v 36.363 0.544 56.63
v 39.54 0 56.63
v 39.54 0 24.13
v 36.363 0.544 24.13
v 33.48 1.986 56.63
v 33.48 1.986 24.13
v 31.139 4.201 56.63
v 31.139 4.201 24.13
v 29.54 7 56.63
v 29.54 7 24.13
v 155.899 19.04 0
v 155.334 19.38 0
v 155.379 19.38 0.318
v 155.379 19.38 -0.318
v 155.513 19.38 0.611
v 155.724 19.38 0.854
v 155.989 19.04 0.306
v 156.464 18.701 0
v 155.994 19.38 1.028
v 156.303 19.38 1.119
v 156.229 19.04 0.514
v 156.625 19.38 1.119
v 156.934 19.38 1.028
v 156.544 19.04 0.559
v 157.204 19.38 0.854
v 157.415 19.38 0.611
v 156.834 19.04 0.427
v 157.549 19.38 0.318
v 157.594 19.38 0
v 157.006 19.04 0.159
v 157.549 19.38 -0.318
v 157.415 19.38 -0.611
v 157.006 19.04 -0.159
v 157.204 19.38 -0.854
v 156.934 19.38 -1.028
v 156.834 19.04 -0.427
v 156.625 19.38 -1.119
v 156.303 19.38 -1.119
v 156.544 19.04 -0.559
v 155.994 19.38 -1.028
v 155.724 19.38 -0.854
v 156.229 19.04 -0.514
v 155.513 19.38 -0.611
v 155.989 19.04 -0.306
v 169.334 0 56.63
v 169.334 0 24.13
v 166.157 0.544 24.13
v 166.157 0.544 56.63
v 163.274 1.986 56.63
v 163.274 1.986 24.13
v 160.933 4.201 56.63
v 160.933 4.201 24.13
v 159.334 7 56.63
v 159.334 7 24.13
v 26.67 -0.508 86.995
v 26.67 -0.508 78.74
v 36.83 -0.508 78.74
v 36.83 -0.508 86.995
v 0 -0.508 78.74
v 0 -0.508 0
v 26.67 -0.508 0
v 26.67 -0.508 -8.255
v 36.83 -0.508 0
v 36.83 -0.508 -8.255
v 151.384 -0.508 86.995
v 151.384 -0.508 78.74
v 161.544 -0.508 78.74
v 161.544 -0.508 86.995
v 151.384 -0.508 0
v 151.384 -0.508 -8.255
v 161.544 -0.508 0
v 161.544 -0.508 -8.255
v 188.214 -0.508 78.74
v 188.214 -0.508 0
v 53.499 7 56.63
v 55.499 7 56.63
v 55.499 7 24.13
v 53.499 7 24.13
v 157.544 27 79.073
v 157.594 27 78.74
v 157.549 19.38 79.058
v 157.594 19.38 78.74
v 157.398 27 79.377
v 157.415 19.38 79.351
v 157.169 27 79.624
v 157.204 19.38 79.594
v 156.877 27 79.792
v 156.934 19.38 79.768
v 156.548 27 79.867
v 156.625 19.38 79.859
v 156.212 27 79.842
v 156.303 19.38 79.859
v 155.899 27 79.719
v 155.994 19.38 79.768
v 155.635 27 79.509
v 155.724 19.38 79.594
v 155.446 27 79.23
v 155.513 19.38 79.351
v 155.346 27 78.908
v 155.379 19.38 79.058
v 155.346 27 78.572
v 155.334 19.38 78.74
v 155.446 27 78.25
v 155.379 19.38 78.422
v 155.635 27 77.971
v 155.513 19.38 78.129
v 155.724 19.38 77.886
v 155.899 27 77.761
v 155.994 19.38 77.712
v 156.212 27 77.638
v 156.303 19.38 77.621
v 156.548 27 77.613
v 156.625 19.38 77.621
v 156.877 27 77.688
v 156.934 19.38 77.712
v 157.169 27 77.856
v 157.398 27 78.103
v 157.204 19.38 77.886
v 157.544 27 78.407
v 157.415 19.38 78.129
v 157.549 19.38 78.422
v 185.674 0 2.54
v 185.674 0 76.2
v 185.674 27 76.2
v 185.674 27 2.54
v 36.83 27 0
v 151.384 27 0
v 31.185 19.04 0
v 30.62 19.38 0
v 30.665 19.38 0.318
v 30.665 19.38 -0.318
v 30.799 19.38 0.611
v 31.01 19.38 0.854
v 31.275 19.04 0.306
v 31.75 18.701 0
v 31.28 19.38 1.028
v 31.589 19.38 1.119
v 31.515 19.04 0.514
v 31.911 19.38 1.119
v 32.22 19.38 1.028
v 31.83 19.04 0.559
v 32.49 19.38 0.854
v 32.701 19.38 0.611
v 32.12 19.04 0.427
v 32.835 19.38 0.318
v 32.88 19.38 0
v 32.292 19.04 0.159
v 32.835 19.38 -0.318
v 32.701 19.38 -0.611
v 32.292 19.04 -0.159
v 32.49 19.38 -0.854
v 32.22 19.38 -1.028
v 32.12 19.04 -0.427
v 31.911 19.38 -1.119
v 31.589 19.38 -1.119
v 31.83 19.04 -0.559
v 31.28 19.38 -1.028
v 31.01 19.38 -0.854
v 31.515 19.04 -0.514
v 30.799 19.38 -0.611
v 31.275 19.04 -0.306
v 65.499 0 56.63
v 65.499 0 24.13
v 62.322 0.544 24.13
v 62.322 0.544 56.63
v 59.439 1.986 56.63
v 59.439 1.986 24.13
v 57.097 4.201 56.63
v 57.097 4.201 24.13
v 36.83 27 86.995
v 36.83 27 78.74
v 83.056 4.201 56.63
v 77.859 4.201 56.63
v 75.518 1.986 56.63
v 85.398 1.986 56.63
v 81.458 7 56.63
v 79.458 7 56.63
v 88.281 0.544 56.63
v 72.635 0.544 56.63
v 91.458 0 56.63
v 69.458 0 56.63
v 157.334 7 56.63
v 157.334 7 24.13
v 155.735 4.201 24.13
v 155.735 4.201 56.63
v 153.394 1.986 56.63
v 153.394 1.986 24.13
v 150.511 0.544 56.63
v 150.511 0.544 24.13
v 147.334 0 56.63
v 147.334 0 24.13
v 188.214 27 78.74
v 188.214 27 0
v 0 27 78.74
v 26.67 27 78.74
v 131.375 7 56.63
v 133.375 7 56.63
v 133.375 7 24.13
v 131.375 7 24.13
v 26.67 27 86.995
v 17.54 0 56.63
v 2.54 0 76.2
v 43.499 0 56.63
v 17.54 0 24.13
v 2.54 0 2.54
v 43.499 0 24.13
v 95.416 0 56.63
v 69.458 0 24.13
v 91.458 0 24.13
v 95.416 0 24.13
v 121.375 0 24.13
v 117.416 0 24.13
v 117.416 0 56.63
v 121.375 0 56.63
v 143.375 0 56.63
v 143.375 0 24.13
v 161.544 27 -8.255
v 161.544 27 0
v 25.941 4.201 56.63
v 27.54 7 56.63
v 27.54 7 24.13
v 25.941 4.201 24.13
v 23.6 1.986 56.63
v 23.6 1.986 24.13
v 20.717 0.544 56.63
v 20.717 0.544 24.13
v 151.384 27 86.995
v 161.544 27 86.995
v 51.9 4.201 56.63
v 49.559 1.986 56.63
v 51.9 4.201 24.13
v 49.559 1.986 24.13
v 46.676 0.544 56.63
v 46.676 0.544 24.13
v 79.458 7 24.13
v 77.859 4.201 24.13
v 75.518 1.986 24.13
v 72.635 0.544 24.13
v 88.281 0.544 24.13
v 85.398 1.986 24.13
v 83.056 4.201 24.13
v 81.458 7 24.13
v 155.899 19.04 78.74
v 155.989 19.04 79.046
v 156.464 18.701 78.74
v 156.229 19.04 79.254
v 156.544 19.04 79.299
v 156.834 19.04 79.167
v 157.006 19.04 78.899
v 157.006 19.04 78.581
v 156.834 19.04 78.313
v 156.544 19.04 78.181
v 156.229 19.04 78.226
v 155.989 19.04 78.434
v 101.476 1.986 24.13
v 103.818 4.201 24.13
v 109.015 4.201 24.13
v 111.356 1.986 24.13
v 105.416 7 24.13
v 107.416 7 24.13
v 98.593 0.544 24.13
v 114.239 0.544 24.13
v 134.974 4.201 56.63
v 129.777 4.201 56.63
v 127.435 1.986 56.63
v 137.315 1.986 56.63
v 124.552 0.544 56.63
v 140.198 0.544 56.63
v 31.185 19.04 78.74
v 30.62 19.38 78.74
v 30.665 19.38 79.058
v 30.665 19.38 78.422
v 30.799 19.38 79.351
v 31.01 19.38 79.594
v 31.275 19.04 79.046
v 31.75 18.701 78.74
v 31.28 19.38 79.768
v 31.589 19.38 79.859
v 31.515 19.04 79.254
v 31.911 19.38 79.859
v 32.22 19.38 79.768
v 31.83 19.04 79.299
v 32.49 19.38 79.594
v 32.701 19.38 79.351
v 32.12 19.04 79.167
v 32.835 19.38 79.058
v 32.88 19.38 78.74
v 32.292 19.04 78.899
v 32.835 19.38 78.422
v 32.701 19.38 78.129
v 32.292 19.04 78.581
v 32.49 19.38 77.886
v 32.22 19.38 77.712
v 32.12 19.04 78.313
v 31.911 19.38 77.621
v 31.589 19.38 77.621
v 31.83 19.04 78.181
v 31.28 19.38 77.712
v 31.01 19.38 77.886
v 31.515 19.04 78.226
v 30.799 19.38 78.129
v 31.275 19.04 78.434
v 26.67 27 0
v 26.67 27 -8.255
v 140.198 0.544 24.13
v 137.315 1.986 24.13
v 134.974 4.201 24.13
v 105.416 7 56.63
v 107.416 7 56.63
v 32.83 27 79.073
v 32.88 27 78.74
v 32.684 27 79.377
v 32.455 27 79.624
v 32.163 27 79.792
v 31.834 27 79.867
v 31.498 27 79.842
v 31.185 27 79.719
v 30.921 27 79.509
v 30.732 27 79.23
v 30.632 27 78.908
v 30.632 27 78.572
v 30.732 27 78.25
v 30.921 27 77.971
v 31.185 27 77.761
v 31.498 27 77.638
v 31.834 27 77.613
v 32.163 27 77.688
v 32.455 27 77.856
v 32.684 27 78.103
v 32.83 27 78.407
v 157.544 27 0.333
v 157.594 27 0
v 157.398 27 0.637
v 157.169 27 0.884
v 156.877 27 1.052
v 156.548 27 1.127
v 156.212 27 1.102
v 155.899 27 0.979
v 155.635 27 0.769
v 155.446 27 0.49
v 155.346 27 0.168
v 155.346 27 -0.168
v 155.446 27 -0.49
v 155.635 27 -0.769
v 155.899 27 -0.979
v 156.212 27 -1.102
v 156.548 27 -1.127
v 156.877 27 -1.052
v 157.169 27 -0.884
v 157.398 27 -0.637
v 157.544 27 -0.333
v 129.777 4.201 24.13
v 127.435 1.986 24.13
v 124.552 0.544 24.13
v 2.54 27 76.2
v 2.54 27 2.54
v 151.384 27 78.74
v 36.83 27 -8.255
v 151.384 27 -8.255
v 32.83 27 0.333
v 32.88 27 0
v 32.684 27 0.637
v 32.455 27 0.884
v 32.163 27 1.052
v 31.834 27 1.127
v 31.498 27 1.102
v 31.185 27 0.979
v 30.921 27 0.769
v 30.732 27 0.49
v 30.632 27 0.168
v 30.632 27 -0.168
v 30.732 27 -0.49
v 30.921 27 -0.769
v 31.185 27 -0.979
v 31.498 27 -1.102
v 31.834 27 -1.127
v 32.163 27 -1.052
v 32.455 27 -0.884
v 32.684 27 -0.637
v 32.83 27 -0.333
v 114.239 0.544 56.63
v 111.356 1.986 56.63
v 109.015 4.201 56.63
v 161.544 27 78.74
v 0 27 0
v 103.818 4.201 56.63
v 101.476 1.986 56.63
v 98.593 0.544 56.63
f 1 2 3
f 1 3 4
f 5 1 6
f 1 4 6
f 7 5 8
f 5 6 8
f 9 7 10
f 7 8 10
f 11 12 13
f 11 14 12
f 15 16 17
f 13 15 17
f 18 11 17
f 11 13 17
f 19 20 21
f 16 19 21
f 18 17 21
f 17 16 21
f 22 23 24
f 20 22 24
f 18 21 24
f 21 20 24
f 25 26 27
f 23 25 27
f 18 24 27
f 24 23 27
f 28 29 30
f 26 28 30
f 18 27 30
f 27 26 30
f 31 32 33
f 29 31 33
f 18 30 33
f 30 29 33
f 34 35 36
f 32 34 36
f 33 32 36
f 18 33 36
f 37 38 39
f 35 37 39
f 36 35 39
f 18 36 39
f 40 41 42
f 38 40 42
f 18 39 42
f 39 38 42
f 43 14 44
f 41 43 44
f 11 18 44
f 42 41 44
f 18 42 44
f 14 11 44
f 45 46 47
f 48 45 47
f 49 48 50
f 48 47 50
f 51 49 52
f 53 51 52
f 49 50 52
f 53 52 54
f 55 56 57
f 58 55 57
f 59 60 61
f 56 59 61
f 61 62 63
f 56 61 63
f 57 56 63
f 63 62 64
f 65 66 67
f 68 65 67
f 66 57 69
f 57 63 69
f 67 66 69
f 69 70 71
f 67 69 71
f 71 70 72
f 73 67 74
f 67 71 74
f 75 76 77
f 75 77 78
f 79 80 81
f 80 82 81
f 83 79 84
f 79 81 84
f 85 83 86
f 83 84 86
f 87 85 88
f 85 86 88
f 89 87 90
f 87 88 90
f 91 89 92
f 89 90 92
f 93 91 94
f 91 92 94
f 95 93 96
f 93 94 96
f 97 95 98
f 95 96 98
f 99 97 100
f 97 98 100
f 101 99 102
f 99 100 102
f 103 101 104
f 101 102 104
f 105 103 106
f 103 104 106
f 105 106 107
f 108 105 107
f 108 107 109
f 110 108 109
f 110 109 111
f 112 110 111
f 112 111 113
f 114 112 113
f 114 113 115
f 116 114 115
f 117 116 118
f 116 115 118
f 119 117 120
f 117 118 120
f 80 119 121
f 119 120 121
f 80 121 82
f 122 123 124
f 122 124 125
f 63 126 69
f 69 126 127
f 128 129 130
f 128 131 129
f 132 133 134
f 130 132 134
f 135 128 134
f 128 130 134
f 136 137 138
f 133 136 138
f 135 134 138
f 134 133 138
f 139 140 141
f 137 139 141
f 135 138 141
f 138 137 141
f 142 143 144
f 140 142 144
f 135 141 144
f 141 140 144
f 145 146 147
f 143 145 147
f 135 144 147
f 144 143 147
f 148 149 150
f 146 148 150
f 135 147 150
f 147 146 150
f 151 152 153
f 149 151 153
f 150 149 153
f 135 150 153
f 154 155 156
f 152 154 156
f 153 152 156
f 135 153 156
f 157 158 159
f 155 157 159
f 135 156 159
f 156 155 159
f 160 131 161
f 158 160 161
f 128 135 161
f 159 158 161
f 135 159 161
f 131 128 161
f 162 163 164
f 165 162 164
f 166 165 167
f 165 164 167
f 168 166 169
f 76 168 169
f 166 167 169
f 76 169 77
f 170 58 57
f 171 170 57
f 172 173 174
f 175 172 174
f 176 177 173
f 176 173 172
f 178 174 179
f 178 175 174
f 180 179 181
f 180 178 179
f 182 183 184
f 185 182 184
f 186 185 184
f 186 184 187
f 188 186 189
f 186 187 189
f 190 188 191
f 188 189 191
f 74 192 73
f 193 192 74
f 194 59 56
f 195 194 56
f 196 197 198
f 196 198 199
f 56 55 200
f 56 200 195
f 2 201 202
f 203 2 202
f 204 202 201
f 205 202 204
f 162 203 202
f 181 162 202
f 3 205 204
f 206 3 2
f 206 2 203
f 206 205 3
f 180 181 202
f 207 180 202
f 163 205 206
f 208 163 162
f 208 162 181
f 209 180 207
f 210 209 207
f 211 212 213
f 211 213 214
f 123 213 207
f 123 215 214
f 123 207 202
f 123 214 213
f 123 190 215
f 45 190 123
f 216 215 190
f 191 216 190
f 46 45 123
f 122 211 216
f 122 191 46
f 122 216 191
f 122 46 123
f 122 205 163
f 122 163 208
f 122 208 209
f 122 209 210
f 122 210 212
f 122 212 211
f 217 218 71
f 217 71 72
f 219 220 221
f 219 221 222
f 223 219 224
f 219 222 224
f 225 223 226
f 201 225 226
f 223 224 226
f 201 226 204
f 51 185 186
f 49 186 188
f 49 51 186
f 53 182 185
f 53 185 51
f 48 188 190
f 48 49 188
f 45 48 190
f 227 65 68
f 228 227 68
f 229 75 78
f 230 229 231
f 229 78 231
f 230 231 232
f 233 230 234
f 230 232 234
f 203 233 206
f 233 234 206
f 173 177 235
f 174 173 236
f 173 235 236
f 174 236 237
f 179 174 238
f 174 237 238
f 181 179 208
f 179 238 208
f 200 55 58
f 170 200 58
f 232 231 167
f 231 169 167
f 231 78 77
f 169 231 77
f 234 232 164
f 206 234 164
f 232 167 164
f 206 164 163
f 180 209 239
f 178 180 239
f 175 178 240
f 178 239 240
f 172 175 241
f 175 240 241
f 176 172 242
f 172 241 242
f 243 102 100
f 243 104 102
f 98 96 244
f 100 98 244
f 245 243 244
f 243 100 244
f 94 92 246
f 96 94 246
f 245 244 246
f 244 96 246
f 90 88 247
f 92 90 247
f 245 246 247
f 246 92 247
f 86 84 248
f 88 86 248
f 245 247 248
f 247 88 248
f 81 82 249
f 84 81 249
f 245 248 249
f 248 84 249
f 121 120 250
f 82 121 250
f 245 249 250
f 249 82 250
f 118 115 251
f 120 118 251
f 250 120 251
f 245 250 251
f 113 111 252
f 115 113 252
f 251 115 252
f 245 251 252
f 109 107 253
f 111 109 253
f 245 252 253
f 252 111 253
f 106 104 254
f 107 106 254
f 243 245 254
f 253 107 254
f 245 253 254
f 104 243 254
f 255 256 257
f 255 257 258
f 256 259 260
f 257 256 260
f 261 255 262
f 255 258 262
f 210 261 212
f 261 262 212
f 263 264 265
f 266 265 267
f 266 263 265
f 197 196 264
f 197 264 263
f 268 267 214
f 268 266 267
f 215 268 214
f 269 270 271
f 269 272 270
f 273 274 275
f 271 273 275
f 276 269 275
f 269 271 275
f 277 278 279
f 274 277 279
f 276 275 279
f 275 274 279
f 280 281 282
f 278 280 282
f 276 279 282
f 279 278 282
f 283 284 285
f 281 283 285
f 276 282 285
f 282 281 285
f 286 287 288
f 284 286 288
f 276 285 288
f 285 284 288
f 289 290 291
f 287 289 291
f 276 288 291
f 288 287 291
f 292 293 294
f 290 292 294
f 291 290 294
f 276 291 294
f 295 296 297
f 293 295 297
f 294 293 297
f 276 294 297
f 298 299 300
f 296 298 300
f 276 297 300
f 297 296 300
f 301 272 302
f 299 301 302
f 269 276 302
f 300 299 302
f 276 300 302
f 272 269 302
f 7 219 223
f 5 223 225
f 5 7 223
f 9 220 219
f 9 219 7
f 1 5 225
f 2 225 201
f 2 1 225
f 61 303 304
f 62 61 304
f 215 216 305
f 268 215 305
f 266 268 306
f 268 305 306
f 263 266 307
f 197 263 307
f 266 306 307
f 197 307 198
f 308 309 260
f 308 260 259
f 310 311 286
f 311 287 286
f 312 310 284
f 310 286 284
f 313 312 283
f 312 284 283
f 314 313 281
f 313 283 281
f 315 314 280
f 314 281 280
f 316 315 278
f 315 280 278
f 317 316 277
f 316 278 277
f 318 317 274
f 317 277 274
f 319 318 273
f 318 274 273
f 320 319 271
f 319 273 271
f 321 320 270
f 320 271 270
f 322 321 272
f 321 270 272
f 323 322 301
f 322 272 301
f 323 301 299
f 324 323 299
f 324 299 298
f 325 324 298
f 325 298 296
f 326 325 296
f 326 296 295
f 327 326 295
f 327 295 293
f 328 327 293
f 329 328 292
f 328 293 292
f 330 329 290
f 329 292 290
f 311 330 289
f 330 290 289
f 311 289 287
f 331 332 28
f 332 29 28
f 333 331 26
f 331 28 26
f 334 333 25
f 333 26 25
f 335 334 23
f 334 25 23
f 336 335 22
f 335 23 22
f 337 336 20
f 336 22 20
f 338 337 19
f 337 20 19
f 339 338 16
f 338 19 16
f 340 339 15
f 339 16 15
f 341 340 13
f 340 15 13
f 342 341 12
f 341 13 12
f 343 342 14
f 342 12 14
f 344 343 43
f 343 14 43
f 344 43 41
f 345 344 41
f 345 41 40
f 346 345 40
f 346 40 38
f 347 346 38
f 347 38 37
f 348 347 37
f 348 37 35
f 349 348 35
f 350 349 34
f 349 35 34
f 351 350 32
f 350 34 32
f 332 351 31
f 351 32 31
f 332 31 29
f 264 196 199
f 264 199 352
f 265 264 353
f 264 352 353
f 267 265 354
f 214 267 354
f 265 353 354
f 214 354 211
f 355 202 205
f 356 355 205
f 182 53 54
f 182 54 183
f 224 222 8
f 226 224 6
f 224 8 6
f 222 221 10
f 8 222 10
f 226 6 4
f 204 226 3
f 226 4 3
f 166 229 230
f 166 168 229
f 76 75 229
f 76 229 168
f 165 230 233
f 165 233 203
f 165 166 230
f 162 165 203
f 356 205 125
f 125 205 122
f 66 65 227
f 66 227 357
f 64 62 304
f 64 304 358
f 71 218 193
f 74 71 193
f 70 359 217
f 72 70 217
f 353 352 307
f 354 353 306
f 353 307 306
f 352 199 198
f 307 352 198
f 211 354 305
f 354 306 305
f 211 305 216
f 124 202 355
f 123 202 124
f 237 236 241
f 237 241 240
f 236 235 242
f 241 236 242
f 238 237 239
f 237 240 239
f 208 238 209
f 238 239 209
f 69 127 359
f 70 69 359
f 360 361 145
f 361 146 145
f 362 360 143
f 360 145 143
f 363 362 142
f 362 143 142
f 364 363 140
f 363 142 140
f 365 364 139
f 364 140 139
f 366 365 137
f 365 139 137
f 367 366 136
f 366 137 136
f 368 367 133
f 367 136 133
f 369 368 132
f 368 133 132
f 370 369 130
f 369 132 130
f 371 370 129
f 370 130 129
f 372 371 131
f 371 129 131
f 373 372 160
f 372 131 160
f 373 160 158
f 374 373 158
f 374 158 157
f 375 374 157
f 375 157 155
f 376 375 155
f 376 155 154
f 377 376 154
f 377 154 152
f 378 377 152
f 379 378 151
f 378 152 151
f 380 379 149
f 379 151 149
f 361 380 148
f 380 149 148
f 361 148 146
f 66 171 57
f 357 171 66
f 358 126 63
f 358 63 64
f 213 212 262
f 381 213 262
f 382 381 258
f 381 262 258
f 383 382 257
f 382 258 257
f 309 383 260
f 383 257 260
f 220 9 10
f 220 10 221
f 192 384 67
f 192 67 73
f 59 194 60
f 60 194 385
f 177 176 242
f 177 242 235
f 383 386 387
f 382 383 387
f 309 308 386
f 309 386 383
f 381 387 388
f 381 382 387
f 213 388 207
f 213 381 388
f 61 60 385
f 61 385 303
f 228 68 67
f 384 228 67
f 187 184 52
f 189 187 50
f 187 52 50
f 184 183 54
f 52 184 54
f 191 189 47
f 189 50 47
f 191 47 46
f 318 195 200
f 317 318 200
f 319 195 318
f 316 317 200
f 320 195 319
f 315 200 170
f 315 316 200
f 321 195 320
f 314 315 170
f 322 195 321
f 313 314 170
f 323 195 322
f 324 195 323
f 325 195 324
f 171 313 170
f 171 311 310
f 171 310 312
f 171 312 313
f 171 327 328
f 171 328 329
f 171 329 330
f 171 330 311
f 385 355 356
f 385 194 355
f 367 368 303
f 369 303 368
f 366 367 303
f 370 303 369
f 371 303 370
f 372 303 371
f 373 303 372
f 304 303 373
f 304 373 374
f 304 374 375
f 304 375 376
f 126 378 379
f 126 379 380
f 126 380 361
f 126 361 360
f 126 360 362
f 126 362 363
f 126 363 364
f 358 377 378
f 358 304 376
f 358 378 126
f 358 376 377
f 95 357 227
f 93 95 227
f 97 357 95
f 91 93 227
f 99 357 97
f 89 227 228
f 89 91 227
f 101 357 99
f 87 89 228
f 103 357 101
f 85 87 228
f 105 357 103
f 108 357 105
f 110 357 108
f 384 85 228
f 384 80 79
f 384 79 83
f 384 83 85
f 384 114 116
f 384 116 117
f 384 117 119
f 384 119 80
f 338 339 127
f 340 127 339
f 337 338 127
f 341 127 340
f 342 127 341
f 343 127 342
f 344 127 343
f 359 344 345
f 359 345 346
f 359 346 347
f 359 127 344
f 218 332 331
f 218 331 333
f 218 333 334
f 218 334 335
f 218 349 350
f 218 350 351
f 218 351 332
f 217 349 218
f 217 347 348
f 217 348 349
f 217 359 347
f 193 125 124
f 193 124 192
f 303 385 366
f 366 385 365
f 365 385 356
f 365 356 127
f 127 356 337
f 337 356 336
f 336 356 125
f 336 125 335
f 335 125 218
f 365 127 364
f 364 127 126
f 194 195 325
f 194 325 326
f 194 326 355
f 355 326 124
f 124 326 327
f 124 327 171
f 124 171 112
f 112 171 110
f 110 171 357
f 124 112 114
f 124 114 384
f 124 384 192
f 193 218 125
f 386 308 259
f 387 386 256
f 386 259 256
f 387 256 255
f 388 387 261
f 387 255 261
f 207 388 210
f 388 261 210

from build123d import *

# Parameters (mm, degrees)
SKETCH1_W                 = 188.214
SKETCH1_H                 = 78.74
BOSS_EXTRUDE1_DEPTH       = 0.508
SKETCH1_3_W               = 188.214
SKETCH1_3_H               = 8.255
SKETCH1_3_H_2             = 78.74
SKETCH1_3_W_2             = 183.134
SKETCH1_3_H_3             = 73.66
BOSS_EXTRUDE2_DEPTH       = 27
BOSS_EXTRUDE3_START       = 21.59
BOSS_EXTRUDE3_DEPTH       = 32.5
SKETCH1_4_W               = 188.214
SKETCH1_4_H               = 8.255
BOSS_EXTRUDE4_DEPTH       = 0.508
F_4_40_TAPPED_HOLE2_D     = 2.2606
F_4_40_TAPPED_HOLE2_DEPTH = 7.62
F_4_40_TAPPED_HOLE2_TIP   = 0.679152758
SKETCH11_W                = 114.554
SKETCH11_H                = 8.255
SKETCH11_W_2              = 26.67
CUT_EXTRUDE1_DEPTH        = 28.508


with BuildPart() as part:
    # Sketch1 → Boss-Extrude1 (new body)
    with BuildSketch(Plane(origin=(0, 0, 0), x_dir=(1, 0, 0), z_dir=(0, 1, 0))):
        with Locations((94.107, -39.37)):
            Rectangle(SKETCH1_W, SKETCH1_H)
    extrude(amount=-BOSS_EXTRUDE1_DEPTH)

    # Sketch1<3> → Boss-Extrude2 (add)
    with BuildSketch(Plane(origin=(0, 0, 0), x_dir=(1, 0, 0), z_dir=(0, 1, 0))):
        with Locations((94.107, 4.1275)):
            Rectangle(SKETCH1_3_W, SKETCH1_3_H)
        with Locations((94.107, -82.8675)):
            Rectangle(SKETCH1_3_W, SKETCH1_3_H)
        with Locations((94.107, -39.37)):
            Rectangle(SKETCH1_3_W, SKETCH1_3_H_2)
        with Locations((94.107, -39.37)):
            Rectangle(SKETCH1_3_W_2, SKETCH1_3_H_3, mode=Mode.SUBTRACT)
    extrude(amount=BOSS_EXTRUDE2_DEPTH)

    # Sketch5 → Boss-Extrude3 (add)
    with BuildSketch(Plane.XY.offset(2.54).offset(BOSS_EXTRUDE3_START)):
        with BuildLine():
            Line((29.54, 7), (27.54, 7))
            ThreePointArc((27.54, 7), (23.600043647, 1.985651932), (17.54, 0))
            Line((17.54, 0), (39.54, 0))
            ThreePointArc((39.54, 0), (33.479956353, 1.985651932), (29.54, 7))
        make_face()
        with BuildLine():
            Line((55.4988, 7), (53.4988, 7))
            ThreePointArc((53.4988, 7), (49.558843647, 1.985651932), (43.4988, 0))
            Line((43.4988, 0), (65.4988, 0))
            ThreePointArc((65.4988, 0), (59.438756353, 1.985651932), (55.4988, 7))
        make_face()
        with BuildLine():
            Line((81.4576, 7), (79.4576, 7))
            ThreePointArc((79.4576, 7), (75.517643647, 1.985651932), (69.4576, 0))
            Line((69.4576, 0), (91.4576, 0))
            ThreePointArc((91.4576, 0), (85.397556353, 1.985651932), (81.4576, 7))
        make_face()
        with BuildLine():
            Line((107.4164, 7), (105.4164, 7))
            ThreePointArc((105.4164, 7), (101.476443647, 1.985651932), (95.4164, 0))
            Line((95.4164, 0), (117.4164, 0))
            ThreePointArc((117.4164, 0), (111.356356353, 1.985651932), (107.4164, 7))
        make_face()
        with BuildLine():
            Line((133.3752, 7), (131.3752, 7))
            ThreePointArc((131.3752, 7), (127.435243647, 1.985651932), (121.3752, 0))
            Line((121.3752, 0), (143.3752, 0))
            ThreePointArc((143.3752, 0), (137.315156353, 1.985651932), (133.3752, 7))
        make_face()
        with BuildLine():
            Line((159.334, 7), (157.334, 7))
            ThreePointArc((157.334, 7), (153.394043647, 1.985651932), (147.334, 0))
            Line((147.334, 0), (169.334, 0))
            ThreePointArc((169.334, 0), (163.273956353, 1.985651932), (159.334, 7))
        make_face()
    extrude(amount=BOSS_EXTRUDE3_DEPTH)

    # Sketch1<4> → Boss-Extrude4 (add)
    with BuildSketch(Plane(origin=(0, 0, 0), x_dir=(1, 0, 0), z_dir=(0, 1, 0))):
        with Locations((94.107, 4.1275)):
            Rectangle(SKETCH1_4_W, SKETCH1_4_H)
        with Locations((94.107, -82.8675)):
            Rectangle(SKETCH1_4_W, SKETCH1_4_H)
    extrude(amount=-BOSS_EXTRUDE4_DEPTH)

    # #4-40 Tapped Hole2
    with Locations(Plane(origin=(0, 27, 0), x_dir=(-1, 0, 0), z_dir=(0, 1, 0))):
        with Locations((-31.75, 0), (-156.464, 0), (-31.75, 78.74), (-156.464, 78.74)):
            Hole(F_4_40_TAPPED_HOLE2_D / 2, depth=F_4_40_TAPPED_HOLE2_DEPTH)
            with Locations((0, 0, -(F_4_40_TAPPED_HOLE2_DEPTH + F_4_40_TAPPED_HOLE2_TIP / 2))):  # 118° drill point
                Cone(0, F_4_40_TAPPED_HOLE2_D / 2, F_4_40_TAPPED_HOLE2_TIP, mode=Mode.SUBTRACT)

    # Sketch11 → Cut-Extrude1 (cut, through all)
    with BuildSketch(Plane(origin=(0, 27, 0), x_dir=(1, 0, 0), z_dir=(0, 1, 0))):
        with Locations((94.107, 4.1275)):
            Rectangle(SKETCH11_W, SKETCH11_H)
        with Locations((94.107, -82.8675)):
            Rectangle(SKETCH11_W, SKETCH11_H)
        with Locations((13.335, 4.1275)):
            Rectangle(SKETCH11_W_2, SKETCH11_H)
        with Locations((174.879, 4.1275)):
            Rectangle(SKETCH11_W_2, SKETCH11_H)
        with Locations((174.879, -82.8675)):
            Rectangle(SKETCH11_W_2, SKETCH11_H)
        with Locations((13.335, -82.8675)):
            Rectangle(SKETCH11_W_2, SKETCH11_H)
    extrude(amount=-CUT_EXTRUDE1_DEPTH, mode=Mode.SUBTRACT)


solid = part.part
